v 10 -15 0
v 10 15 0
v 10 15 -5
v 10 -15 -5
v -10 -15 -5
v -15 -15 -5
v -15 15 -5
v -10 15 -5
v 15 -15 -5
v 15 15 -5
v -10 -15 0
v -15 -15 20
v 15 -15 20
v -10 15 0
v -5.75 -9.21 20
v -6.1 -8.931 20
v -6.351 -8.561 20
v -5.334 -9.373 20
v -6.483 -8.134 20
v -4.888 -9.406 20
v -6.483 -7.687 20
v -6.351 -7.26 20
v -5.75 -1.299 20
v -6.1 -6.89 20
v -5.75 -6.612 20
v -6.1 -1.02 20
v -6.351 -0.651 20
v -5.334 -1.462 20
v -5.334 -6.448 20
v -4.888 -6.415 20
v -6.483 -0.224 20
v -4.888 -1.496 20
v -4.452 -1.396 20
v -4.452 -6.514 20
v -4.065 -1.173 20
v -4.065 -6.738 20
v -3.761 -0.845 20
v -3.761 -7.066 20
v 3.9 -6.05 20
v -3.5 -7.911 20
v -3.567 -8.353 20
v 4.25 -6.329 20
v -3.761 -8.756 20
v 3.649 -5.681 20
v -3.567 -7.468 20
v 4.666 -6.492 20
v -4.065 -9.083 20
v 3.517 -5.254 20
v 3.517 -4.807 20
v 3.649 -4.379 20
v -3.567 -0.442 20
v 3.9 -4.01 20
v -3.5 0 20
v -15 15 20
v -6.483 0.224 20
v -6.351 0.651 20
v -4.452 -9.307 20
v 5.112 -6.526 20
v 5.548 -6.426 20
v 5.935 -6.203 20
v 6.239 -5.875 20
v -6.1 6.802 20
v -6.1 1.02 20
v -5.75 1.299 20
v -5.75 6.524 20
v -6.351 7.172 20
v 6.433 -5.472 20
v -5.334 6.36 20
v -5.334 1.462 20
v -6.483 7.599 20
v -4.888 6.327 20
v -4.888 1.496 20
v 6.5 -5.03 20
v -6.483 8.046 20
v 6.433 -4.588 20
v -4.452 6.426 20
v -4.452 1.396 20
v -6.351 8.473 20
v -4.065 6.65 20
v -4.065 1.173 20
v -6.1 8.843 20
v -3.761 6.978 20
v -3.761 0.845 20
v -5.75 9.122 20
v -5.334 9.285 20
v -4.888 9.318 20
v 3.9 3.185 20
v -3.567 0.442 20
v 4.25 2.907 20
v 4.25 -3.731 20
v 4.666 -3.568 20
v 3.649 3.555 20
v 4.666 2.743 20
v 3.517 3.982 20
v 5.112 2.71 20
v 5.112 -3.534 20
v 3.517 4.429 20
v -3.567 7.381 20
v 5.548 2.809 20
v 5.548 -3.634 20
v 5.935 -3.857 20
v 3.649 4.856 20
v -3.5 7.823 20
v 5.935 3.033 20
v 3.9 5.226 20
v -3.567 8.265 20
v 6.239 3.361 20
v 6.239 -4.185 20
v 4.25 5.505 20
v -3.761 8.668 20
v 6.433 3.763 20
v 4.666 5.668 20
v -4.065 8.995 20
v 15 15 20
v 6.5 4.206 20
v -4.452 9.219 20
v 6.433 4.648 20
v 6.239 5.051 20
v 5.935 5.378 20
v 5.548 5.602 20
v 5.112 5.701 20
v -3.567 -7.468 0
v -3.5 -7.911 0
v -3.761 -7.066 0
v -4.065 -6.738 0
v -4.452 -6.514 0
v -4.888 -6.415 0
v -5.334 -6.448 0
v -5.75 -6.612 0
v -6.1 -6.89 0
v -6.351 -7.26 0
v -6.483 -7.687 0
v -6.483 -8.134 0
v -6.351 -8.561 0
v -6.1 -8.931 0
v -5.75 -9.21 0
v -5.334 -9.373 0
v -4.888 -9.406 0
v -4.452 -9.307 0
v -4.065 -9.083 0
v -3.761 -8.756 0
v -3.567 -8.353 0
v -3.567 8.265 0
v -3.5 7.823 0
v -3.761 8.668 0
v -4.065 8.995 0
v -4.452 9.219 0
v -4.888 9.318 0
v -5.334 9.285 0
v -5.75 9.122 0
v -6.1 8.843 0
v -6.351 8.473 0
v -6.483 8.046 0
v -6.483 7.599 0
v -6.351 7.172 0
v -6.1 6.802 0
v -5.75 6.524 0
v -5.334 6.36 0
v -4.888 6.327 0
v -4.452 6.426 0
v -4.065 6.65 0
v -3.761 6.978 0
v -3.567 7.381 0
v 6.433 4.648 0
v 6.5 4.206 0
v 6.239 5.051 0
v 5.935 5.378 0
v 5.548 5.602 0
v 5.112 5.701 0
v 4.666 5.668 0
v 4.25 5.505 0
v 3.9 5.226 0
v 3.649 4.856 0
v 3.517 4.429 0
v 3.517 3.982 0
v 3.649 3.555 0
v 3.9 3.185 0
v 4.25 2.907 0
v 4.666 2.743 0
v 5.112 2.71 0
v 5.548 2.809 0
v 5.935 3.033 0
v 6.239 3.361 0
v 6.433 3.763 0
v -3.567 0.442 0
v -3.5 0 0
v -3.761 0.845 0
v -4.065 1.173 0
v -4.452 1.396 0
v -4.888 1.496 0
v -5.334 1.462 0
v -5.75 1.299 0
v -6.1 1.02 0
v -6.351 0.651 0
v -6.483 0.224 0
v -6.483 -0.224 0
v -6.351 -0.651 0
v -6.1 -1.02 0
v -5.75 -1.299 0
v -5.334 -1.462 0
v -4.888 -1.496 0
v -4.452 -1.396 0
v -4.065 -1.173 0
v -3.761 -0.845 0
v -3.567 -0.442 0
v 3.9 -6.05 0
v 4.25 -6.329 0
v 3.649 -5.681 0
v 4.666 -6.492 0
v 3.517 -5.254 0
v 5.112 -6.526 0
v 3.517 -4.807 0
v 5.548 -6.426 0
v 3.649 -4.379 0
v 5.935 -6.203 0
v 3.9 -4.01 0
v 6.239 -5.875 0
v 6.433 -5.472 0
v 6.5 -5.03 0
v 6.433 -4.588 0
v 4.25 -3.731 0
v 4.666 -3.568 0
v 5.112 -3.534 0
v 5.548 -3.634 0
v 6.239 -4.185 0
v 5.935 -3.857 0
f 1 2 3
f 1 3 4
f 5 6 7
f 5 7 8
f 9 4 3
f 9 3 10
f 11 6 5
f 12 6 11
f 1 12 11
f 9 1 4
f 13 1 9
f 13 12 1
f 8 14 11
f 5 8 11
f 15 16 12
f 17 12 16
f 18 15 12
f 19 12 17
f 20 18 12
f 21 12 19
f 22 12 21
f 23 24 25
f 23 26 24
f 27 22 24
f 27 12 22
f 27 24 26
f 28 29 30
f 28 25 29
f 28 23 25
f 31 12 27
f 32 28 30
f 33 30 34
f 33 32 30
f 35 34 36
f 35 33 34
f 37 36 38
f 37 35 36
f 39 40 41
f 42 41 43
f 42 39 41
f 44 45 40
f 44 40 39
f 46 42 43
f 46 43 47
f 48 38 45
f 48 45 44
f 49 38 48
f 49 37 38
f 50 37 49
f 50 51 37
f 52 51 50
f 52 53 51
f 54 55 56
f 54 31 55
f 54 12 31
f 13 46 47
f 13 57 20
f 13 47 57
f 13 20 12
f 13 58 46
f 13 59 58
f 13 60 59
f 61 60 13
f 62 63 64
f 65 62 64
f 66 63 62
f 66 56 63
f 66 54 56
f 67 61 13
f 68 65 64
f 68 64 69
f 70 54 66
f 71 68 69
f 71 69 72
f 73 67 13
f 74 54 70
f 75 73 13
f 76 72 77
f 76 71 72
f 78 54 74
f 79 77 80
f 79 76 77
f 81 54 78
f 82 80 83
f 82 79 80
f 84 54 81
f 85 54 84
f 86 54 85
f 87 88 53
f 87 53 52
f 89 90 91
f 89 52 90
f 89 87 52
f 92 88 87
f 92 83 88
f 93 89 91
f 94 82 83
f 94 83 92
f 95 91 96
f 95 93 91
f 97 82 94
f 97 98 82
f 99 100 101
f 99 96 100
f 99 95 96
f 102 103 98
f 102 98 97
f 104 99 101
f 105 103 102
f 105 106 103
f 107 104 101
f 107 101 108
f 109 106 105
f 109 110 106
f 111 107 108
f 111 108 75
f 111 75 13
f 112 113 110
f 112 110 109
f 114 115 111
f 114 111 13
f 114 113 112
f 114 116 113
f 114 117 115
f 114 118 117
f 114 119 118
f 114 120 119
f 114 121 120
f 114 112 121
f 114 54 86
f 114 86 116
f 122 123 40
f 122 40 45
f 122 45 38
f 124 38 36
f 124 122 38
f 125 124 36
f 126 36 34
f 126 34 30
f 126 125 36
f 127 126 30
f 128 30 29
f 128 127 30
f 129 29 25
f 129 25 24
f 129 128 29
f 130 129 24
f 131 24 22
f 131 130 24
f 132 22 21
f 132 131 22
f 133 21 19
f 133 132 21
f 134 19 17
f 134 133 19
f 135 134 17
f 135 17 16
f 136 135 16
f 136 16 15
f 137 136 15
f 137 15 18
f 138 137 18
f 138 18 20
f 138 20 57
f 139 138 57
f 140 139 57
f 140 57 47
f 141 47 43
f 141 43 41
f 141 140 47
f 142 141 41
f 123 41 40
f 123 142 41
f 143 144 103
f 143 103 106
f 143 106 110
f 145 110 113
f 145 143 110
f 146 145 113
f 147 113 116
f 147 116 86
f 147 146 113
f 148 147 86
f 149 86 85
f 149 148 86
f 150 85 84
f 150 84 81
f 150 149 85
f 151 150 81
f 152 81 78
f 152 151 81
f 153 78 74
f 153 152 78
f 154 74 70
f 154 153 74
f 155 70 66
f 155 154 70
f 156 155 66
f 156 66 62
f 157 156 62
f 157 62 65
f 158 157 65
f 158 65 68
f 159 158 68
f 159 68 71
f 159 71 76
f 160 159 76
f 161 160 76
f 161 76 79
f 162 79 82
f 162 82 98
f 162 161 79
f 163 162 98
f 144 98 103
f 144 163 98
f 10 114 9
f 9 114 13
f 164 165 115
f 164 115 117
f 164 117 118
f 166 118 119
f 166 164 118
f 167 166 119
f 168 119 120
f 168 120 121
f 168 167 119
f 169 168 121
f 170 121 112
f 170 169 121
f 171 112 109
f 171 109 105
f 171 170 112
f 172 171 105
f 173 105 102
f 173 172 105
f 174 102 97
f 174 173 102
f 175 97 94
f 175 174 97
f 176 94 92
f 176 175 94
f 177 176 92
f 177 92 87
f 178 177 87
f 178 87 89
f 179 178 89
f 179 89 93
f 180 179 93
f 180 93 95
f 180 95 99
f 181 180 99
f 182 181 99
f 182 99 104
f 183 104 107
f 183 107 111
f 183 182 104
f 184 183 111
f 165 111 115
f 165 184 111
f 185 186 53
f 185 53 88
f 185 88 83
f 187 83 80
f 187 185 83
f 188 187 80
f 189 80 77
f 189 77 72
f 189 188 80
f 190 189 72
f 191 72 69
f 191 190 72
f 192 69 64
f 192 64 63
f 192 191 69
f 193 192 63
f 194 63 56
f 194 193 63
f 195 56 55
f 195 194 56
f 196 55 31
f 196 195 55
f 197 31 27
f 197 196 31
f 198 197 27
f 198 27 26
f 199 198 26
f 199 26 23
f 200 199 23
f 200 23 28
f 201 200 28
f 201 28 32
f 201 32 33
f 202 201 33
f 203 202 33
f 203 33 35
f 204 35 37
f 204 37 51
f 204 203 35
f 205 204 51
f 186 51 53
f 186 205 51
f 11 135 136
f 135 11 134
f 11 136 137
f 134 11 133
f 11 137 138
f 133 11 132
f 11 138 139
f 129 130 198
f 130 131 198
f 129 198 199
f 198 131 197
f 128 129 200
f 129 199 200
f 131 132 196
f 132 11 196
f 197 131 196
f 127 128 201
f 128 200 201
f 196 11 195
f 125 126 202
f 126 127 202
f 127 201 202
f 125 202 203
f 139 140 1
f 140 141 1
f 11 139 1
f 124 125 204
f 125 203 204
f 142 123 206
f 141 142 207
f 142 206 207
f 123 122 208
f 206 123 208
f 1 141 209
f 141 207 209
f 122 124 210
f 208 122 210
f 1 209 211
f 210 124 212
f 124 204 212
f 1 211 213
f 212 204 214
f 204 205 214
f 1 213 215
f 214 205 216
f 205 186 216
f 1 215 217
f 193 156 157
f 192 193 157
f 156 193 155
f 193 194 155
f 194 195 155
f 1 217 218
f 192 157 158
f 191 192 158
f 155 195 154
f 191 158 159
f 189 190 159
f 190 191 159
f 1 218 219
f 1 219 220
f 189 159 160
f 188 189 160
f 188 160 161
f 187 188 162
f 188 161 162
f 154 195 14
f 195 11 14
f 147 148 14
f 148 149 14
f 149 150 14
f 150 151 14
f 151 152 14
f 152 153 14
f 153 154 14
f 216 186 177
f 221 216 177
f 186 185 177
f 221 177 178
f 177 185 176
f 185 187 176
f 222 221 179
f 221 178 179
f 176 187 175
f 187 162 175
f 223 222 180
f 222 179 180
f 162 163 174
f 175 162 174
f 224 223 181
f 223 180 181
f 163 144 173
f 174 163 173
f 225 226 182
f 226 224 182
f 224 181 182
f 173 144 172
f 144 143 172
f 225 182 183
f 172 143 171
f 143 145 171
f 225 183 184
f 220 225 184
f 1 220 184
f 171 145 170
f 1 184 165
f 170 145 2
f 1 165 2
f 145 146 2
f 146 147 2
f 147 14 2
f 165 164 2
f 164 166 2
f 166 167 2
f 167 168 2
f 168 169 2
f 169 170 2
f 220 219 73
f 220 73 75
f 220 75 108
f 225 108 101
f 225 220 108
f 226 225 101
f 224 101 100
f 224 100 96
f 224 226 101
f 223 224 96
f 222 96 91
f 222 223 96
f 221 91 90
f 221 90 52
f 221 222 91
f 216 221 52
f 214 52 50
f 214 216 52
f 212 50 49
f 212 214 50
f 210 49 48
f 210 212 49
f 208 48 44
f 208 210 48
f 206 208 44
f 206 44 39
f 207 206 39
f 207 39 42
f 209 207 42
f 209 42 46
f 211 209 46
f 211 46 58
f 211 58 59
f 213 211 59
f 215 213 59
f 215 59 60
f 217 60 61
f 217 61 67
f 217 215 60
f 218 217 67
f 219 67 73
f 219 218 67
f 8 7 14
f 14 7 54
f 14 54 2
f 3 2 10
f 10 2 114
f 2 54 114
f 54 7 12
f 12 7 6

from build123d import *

# Parameters (mm, degrees)
F0_R     = 3.5
F0_R_2   = 1.5
F1_DEPTH = 20
F2_W     = 5
F2_H     = 30
F3_DEPTH = 5


with BuildPart() as f1:
    # F0 (on Top) → F1 (new body)
    with BuildSketch(Plane.XY):
        Polygon((-10, 15), (-15, 15), (-15, -15), (-10, -15), (10, -15), (15, -15), (15, 15), (10, 15), align=None)
        with Locations((-5, -7.9105878249)):
            Circle(F0_R, mode=Mode.SUBTRACT)
        with Locations((5, -5.0300965086)):
            Circle(F0_R, mode=Mode.SUBTRACT)
        with Locations((-5, 0)):
            Circle(F0_R, mode=Mode.SUBTRACT)
        with Locations((-5, 7.8226719052)):
            Circle(F0_R, mode=Mode.SUBTRACT)
        with Locations((5, 4.2056075387)):
            Circle(F0_R, mode=Mode.SUBTRACT)
        with Locations((5, 4.2056075387)):
            Circle(F0_R)
        with Locations((5, 4.2056075387)):
            Circle(F0_R_2, mode=Mode.SUBTRACT)
        with Locations((-5, 7.8226719052)):
            Circle(F0_R)
        with Locations((-5, 7.8226719052)):
            Circle(F0_R_2, mode=Mode.SUBTRACT)
        with Locations((-5, 0)):
            Circle(F0_R)
        with Locations((-5, 0)):
            Circle(F0_R_2, mode=Mode.SUBTRACT)
        with Locations((-5, -7.9105878249)):
            Circle(F0_R)
        with Locations((-5, -7.9105878249)):
            Circle(F0_R_2, mode=Mode.SUBTRACT)
        with Locations((5, -5.0300965086)):
            Circle(F0_R)
        with Locations((5, -5.0300965086)):
            Circle(F0_R_2, mode=Mode.SUBTRACT)
    extrude(amount=F1_DEPTH)

    # F2 (on face) → F3 (join)
    with BuildSketch(Plane(origin=(0, 0, 0), x_dir=(1, 0, 0), z_dir=(0, 0, -1))):
        with Locations((12.5, 0)):
            Rectangle(F2_W, F2_H)
        with Locations((-12.5, 0)):
            Rectangle(F2_W, F2_H)
    extrude(amount=F3_DEPTH)


solid = f1.part
